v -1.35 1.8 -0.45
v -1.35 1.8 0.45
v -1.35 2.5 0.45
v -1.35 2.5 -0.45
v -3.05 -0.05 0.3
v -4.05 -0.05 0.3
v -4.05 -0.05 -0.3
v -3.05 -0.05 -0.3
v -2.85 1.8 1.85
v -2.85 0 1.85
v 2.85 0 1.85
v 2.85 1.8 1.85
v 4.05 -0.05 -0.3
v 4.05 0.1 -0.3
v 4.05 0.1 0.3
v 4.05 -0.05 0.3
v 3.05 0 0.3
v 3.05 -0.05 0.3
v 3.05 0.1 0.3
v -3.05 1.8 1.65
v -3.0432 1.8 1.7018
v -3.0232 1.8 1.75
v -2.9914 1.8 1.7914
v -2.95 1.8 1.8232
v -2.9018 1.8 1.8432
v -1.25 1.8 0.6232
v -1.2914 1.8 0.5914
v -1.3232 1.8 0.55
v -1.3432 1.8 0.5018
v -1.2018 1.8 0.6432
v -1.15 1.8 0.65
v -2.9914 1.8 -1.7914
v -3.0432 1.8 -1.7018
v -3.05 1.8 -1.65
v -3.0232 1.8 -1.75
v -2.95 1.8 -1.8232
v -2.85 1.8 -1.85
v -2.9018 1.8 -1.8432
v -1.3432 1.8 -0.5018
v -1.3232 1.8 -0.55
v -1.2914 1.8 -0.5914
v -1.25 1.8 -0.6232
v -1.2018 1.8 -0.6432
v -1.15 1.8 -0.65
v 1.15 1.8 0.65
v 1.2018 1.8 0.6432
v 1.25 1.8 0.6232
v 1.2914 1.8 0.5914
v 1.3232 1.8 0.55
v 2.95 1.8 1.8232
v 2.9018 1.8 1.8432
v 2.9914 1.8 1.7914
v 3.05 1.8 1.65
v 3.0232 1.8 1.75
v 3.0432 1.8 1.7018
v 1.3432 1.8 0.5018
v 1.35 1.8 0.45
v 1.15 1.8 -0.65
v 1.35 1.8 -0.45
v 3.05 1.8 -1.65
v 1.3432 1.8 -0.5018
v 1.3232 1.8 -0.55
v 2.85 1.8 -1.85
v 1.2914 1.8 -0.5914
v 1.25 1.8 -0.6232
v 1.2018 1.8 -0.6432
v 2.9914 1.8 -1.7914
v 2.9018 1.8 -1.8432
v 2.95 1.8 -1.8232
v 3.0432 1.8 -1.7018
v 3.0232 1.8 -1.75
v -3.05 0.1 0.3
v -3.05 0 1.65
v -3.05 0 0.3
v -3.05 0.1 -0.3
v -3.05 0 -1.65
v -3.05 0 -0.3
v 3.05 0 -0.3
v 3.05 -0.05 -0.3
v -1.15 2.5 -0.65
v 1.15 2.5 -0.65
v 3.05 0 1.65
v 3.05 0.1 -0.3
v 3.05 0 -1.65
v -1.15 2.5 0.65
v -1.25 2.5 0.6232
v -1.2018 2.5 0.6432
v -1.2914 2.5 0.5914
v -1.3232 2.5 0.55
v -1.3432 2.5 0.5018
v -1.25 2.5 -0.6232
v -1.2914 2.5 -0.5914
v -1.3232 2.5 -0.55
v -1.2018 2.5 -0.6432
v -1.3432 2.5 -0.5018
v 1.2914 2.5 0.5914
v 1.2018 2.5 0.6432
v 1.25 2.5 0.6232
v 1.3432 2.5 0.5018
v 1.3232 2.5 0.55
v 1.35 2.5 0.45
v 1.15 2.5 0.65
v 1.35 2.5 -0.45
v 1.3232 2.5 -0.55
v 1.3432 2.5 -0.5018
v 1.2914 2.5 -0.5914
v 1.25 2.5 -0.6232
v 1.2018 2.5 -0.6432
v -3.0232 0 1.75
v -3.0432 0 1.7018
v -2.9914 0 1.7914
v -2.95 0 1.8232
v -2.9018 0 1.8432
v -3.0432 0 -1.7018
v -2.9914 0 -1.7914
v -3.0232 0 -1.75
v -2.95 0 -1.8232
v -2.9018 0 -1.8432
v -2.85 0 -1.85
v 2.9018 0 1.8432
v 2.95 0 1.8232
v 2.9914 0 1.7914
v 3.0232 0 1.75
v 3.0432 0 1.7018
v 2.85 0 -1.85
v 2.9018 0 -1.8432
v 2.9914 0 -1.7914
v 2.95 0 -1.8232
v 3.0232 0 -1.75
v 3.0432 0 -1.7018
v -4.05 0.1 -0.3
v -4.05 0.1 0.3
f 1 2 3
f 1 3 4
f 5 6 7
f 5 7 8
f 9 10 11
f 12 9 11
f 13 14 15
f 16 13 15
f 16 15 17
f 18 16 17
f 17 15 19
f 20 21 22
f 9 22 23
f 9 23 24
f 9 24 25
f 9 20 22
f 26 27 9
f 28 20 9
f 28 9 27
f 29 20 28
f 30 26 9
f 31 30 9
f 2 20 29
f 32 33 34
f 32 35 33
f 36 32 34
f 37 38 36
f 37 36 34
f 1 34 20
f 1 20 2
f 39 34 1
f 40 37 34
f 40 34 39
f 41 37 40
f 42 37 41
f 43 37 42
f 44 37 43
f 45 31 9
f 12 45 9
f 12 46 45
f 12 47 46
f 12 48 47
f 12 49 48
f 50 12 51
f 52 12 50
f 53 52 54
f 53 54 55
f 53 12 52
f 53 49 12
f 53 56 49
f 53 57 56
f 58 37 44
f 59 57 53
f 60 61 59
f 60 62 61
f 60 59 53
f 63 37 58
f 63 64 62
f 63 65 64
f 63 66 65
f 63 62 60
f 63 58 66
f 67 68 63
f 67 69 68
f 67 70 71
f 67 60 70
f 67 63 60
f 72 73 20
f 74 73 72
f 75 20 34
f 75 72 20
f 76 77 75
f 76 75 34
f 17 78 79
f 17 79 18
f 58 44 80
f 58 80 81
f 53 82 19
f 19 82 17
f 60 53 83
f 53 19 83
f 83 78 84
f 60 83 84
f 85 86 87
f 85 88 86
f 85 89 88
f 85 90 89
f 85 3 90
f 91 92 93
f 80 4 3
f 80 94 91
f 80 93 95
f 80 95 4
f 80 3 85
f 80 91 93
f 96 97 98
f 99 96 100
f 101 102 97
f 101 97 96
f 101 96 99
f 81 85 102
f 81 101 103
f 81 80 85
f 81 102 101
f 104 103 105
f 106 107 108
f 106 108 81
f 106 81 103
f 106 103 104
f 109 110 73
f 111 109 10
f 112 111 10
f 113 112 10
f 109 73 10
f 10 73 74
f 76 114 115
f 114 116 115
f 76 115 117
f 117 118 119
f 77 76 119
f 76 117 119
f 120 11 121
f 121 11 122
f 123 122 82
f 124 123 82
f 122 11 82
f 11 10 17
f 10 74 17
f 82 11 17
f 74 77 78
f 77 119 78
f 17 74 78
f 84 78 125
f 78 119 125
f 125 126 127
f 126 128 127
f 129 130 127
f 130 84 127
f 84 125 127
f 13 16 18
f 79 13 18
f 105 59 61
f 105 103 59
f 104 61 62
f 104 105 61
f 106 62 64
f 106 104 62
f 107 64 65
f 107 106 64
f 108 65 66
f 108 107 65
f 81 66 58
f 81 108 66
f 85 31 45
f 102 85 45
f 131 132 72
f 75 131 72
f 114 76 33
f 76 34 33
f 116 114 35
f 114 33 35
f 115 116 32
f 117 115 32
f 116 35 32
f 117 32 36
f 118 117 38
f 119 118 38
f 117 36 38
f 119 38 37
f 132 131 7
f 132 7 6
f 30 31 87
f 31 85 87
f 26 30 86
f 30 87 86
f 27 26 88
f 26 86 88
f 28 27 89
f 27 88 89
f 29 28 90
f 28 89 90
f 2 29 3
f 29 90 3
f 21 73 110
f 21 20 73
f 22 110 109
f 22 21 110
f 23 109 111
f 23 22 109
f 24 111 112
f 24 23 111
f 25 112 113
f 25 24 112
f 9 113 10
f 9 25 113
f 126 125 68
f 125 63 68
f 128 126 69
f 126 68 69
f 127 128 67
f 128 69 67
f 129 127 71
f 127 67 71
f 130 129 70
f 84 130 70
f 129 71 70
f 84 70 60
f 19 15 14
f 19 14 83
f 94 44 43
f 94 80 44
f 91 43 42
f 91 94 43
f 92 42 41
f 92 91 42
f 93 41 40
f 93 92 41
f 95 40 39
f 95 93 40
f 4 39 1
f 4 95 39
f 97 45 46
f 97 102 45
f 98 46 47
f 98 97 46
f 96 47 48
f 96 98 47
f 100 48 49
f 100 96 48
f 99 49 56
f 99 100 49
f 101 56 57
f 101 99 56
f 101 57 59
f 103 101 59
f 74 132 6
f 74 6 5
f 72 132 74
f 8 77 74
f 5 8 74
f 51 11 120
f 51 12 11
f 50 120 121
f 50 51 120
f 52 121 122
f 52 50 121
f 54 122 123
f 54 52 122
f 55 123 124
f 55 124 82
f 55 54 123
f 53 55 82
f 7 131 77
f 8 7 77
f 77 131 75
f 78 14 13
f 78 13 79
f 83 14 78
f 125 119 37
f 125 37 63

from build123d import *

# Parameters (mm, degrees)
SKETCH_1_W      = 6.1
SKETCH_1_H      = 3.7
EXTRUDE_1_DEPTH = 1.8
SKETCH_3_W      = 2.7
SKETCH_3_H      = 1.3
EXTRUDE_2_DEPTH = 0.7
EXTRUDE_START   = -0.1
SKETCH_4_W      = 1
SKETCH_4_H      = 0.6
EXTRUDE_3_DEPTH = 0.15
FILLET_1_R      = 0.2
FILLET_2_R      = 0.2


with BuildPart() as part:
    # Эскиз1 → Бобышка-Вытянуть1 (new body)
    with BuildSketch(Plane(origin=(0, 0, 0), x_dir=(1, 0, 0), z_dir=(0, 1, 0))):
        Rectangle(SKETCH_1_W, SKETCH_1_H)
    extrude(amount=EXTRUDE_1_DEPTH)

    # Эскиз3 → Бобышка-Вытянуть2 (add)
    with BuildSketch(Plane(origin=(0, 1.8, 0), x_dir=(1, 0, 0), z_dir=(0, 1, 0))):
        Rectangle(SKETCH_3_W, SKETCH_3_H)
    extrude(amount=EXTRUDE_2_DEPTH)

    # Эскиз4 → Бобышка-Вытянуть3 (add)
    with BuildSketch(Plane.XZ.offset(EXTRUDE_START)):
        with Locations((-3.55, 0)):
            Rectangle(SKETCH_4_W, SKETCH_4_H)
    extrude_3 = extrude(amount=EXTRUDE_3_DEPTH)

    # Зеркальное отражение1: Бобышка-Вытянуть3 across plane
    add(extrude_3.mirror(Plane(origin=(0, 0, 0), x_dir=(0, 0, 1), z_dir=(1, 0, 0))))

    # Скругление1
    fillet_1_edges = [part.edges().sort_by_distance(p)[0] for p in [
        (1.35, 2.15, 0.65),
        (1.35, 2.15, -0.65),
        (-1.35, 2.15, -0.65),
        (-1.35, 2.15, 0.65),
    ]]
    fillet(fillet_1_edges, radius=FILLET_1_R)

    # Скругление2
    fillet_2_edges = [part.edges().sort_by_distance(p)[0] for p in [
        (3.05, 0.9, 1.85),
        (-3.05, 0.9, 1.85),
        (-3.05, 0.9, -1.85),
        (3.05, 0.9, -1.85),
    ]]
    fillet(fillet_2_edges, radius=FILLET_2_R)


solid = part.part
